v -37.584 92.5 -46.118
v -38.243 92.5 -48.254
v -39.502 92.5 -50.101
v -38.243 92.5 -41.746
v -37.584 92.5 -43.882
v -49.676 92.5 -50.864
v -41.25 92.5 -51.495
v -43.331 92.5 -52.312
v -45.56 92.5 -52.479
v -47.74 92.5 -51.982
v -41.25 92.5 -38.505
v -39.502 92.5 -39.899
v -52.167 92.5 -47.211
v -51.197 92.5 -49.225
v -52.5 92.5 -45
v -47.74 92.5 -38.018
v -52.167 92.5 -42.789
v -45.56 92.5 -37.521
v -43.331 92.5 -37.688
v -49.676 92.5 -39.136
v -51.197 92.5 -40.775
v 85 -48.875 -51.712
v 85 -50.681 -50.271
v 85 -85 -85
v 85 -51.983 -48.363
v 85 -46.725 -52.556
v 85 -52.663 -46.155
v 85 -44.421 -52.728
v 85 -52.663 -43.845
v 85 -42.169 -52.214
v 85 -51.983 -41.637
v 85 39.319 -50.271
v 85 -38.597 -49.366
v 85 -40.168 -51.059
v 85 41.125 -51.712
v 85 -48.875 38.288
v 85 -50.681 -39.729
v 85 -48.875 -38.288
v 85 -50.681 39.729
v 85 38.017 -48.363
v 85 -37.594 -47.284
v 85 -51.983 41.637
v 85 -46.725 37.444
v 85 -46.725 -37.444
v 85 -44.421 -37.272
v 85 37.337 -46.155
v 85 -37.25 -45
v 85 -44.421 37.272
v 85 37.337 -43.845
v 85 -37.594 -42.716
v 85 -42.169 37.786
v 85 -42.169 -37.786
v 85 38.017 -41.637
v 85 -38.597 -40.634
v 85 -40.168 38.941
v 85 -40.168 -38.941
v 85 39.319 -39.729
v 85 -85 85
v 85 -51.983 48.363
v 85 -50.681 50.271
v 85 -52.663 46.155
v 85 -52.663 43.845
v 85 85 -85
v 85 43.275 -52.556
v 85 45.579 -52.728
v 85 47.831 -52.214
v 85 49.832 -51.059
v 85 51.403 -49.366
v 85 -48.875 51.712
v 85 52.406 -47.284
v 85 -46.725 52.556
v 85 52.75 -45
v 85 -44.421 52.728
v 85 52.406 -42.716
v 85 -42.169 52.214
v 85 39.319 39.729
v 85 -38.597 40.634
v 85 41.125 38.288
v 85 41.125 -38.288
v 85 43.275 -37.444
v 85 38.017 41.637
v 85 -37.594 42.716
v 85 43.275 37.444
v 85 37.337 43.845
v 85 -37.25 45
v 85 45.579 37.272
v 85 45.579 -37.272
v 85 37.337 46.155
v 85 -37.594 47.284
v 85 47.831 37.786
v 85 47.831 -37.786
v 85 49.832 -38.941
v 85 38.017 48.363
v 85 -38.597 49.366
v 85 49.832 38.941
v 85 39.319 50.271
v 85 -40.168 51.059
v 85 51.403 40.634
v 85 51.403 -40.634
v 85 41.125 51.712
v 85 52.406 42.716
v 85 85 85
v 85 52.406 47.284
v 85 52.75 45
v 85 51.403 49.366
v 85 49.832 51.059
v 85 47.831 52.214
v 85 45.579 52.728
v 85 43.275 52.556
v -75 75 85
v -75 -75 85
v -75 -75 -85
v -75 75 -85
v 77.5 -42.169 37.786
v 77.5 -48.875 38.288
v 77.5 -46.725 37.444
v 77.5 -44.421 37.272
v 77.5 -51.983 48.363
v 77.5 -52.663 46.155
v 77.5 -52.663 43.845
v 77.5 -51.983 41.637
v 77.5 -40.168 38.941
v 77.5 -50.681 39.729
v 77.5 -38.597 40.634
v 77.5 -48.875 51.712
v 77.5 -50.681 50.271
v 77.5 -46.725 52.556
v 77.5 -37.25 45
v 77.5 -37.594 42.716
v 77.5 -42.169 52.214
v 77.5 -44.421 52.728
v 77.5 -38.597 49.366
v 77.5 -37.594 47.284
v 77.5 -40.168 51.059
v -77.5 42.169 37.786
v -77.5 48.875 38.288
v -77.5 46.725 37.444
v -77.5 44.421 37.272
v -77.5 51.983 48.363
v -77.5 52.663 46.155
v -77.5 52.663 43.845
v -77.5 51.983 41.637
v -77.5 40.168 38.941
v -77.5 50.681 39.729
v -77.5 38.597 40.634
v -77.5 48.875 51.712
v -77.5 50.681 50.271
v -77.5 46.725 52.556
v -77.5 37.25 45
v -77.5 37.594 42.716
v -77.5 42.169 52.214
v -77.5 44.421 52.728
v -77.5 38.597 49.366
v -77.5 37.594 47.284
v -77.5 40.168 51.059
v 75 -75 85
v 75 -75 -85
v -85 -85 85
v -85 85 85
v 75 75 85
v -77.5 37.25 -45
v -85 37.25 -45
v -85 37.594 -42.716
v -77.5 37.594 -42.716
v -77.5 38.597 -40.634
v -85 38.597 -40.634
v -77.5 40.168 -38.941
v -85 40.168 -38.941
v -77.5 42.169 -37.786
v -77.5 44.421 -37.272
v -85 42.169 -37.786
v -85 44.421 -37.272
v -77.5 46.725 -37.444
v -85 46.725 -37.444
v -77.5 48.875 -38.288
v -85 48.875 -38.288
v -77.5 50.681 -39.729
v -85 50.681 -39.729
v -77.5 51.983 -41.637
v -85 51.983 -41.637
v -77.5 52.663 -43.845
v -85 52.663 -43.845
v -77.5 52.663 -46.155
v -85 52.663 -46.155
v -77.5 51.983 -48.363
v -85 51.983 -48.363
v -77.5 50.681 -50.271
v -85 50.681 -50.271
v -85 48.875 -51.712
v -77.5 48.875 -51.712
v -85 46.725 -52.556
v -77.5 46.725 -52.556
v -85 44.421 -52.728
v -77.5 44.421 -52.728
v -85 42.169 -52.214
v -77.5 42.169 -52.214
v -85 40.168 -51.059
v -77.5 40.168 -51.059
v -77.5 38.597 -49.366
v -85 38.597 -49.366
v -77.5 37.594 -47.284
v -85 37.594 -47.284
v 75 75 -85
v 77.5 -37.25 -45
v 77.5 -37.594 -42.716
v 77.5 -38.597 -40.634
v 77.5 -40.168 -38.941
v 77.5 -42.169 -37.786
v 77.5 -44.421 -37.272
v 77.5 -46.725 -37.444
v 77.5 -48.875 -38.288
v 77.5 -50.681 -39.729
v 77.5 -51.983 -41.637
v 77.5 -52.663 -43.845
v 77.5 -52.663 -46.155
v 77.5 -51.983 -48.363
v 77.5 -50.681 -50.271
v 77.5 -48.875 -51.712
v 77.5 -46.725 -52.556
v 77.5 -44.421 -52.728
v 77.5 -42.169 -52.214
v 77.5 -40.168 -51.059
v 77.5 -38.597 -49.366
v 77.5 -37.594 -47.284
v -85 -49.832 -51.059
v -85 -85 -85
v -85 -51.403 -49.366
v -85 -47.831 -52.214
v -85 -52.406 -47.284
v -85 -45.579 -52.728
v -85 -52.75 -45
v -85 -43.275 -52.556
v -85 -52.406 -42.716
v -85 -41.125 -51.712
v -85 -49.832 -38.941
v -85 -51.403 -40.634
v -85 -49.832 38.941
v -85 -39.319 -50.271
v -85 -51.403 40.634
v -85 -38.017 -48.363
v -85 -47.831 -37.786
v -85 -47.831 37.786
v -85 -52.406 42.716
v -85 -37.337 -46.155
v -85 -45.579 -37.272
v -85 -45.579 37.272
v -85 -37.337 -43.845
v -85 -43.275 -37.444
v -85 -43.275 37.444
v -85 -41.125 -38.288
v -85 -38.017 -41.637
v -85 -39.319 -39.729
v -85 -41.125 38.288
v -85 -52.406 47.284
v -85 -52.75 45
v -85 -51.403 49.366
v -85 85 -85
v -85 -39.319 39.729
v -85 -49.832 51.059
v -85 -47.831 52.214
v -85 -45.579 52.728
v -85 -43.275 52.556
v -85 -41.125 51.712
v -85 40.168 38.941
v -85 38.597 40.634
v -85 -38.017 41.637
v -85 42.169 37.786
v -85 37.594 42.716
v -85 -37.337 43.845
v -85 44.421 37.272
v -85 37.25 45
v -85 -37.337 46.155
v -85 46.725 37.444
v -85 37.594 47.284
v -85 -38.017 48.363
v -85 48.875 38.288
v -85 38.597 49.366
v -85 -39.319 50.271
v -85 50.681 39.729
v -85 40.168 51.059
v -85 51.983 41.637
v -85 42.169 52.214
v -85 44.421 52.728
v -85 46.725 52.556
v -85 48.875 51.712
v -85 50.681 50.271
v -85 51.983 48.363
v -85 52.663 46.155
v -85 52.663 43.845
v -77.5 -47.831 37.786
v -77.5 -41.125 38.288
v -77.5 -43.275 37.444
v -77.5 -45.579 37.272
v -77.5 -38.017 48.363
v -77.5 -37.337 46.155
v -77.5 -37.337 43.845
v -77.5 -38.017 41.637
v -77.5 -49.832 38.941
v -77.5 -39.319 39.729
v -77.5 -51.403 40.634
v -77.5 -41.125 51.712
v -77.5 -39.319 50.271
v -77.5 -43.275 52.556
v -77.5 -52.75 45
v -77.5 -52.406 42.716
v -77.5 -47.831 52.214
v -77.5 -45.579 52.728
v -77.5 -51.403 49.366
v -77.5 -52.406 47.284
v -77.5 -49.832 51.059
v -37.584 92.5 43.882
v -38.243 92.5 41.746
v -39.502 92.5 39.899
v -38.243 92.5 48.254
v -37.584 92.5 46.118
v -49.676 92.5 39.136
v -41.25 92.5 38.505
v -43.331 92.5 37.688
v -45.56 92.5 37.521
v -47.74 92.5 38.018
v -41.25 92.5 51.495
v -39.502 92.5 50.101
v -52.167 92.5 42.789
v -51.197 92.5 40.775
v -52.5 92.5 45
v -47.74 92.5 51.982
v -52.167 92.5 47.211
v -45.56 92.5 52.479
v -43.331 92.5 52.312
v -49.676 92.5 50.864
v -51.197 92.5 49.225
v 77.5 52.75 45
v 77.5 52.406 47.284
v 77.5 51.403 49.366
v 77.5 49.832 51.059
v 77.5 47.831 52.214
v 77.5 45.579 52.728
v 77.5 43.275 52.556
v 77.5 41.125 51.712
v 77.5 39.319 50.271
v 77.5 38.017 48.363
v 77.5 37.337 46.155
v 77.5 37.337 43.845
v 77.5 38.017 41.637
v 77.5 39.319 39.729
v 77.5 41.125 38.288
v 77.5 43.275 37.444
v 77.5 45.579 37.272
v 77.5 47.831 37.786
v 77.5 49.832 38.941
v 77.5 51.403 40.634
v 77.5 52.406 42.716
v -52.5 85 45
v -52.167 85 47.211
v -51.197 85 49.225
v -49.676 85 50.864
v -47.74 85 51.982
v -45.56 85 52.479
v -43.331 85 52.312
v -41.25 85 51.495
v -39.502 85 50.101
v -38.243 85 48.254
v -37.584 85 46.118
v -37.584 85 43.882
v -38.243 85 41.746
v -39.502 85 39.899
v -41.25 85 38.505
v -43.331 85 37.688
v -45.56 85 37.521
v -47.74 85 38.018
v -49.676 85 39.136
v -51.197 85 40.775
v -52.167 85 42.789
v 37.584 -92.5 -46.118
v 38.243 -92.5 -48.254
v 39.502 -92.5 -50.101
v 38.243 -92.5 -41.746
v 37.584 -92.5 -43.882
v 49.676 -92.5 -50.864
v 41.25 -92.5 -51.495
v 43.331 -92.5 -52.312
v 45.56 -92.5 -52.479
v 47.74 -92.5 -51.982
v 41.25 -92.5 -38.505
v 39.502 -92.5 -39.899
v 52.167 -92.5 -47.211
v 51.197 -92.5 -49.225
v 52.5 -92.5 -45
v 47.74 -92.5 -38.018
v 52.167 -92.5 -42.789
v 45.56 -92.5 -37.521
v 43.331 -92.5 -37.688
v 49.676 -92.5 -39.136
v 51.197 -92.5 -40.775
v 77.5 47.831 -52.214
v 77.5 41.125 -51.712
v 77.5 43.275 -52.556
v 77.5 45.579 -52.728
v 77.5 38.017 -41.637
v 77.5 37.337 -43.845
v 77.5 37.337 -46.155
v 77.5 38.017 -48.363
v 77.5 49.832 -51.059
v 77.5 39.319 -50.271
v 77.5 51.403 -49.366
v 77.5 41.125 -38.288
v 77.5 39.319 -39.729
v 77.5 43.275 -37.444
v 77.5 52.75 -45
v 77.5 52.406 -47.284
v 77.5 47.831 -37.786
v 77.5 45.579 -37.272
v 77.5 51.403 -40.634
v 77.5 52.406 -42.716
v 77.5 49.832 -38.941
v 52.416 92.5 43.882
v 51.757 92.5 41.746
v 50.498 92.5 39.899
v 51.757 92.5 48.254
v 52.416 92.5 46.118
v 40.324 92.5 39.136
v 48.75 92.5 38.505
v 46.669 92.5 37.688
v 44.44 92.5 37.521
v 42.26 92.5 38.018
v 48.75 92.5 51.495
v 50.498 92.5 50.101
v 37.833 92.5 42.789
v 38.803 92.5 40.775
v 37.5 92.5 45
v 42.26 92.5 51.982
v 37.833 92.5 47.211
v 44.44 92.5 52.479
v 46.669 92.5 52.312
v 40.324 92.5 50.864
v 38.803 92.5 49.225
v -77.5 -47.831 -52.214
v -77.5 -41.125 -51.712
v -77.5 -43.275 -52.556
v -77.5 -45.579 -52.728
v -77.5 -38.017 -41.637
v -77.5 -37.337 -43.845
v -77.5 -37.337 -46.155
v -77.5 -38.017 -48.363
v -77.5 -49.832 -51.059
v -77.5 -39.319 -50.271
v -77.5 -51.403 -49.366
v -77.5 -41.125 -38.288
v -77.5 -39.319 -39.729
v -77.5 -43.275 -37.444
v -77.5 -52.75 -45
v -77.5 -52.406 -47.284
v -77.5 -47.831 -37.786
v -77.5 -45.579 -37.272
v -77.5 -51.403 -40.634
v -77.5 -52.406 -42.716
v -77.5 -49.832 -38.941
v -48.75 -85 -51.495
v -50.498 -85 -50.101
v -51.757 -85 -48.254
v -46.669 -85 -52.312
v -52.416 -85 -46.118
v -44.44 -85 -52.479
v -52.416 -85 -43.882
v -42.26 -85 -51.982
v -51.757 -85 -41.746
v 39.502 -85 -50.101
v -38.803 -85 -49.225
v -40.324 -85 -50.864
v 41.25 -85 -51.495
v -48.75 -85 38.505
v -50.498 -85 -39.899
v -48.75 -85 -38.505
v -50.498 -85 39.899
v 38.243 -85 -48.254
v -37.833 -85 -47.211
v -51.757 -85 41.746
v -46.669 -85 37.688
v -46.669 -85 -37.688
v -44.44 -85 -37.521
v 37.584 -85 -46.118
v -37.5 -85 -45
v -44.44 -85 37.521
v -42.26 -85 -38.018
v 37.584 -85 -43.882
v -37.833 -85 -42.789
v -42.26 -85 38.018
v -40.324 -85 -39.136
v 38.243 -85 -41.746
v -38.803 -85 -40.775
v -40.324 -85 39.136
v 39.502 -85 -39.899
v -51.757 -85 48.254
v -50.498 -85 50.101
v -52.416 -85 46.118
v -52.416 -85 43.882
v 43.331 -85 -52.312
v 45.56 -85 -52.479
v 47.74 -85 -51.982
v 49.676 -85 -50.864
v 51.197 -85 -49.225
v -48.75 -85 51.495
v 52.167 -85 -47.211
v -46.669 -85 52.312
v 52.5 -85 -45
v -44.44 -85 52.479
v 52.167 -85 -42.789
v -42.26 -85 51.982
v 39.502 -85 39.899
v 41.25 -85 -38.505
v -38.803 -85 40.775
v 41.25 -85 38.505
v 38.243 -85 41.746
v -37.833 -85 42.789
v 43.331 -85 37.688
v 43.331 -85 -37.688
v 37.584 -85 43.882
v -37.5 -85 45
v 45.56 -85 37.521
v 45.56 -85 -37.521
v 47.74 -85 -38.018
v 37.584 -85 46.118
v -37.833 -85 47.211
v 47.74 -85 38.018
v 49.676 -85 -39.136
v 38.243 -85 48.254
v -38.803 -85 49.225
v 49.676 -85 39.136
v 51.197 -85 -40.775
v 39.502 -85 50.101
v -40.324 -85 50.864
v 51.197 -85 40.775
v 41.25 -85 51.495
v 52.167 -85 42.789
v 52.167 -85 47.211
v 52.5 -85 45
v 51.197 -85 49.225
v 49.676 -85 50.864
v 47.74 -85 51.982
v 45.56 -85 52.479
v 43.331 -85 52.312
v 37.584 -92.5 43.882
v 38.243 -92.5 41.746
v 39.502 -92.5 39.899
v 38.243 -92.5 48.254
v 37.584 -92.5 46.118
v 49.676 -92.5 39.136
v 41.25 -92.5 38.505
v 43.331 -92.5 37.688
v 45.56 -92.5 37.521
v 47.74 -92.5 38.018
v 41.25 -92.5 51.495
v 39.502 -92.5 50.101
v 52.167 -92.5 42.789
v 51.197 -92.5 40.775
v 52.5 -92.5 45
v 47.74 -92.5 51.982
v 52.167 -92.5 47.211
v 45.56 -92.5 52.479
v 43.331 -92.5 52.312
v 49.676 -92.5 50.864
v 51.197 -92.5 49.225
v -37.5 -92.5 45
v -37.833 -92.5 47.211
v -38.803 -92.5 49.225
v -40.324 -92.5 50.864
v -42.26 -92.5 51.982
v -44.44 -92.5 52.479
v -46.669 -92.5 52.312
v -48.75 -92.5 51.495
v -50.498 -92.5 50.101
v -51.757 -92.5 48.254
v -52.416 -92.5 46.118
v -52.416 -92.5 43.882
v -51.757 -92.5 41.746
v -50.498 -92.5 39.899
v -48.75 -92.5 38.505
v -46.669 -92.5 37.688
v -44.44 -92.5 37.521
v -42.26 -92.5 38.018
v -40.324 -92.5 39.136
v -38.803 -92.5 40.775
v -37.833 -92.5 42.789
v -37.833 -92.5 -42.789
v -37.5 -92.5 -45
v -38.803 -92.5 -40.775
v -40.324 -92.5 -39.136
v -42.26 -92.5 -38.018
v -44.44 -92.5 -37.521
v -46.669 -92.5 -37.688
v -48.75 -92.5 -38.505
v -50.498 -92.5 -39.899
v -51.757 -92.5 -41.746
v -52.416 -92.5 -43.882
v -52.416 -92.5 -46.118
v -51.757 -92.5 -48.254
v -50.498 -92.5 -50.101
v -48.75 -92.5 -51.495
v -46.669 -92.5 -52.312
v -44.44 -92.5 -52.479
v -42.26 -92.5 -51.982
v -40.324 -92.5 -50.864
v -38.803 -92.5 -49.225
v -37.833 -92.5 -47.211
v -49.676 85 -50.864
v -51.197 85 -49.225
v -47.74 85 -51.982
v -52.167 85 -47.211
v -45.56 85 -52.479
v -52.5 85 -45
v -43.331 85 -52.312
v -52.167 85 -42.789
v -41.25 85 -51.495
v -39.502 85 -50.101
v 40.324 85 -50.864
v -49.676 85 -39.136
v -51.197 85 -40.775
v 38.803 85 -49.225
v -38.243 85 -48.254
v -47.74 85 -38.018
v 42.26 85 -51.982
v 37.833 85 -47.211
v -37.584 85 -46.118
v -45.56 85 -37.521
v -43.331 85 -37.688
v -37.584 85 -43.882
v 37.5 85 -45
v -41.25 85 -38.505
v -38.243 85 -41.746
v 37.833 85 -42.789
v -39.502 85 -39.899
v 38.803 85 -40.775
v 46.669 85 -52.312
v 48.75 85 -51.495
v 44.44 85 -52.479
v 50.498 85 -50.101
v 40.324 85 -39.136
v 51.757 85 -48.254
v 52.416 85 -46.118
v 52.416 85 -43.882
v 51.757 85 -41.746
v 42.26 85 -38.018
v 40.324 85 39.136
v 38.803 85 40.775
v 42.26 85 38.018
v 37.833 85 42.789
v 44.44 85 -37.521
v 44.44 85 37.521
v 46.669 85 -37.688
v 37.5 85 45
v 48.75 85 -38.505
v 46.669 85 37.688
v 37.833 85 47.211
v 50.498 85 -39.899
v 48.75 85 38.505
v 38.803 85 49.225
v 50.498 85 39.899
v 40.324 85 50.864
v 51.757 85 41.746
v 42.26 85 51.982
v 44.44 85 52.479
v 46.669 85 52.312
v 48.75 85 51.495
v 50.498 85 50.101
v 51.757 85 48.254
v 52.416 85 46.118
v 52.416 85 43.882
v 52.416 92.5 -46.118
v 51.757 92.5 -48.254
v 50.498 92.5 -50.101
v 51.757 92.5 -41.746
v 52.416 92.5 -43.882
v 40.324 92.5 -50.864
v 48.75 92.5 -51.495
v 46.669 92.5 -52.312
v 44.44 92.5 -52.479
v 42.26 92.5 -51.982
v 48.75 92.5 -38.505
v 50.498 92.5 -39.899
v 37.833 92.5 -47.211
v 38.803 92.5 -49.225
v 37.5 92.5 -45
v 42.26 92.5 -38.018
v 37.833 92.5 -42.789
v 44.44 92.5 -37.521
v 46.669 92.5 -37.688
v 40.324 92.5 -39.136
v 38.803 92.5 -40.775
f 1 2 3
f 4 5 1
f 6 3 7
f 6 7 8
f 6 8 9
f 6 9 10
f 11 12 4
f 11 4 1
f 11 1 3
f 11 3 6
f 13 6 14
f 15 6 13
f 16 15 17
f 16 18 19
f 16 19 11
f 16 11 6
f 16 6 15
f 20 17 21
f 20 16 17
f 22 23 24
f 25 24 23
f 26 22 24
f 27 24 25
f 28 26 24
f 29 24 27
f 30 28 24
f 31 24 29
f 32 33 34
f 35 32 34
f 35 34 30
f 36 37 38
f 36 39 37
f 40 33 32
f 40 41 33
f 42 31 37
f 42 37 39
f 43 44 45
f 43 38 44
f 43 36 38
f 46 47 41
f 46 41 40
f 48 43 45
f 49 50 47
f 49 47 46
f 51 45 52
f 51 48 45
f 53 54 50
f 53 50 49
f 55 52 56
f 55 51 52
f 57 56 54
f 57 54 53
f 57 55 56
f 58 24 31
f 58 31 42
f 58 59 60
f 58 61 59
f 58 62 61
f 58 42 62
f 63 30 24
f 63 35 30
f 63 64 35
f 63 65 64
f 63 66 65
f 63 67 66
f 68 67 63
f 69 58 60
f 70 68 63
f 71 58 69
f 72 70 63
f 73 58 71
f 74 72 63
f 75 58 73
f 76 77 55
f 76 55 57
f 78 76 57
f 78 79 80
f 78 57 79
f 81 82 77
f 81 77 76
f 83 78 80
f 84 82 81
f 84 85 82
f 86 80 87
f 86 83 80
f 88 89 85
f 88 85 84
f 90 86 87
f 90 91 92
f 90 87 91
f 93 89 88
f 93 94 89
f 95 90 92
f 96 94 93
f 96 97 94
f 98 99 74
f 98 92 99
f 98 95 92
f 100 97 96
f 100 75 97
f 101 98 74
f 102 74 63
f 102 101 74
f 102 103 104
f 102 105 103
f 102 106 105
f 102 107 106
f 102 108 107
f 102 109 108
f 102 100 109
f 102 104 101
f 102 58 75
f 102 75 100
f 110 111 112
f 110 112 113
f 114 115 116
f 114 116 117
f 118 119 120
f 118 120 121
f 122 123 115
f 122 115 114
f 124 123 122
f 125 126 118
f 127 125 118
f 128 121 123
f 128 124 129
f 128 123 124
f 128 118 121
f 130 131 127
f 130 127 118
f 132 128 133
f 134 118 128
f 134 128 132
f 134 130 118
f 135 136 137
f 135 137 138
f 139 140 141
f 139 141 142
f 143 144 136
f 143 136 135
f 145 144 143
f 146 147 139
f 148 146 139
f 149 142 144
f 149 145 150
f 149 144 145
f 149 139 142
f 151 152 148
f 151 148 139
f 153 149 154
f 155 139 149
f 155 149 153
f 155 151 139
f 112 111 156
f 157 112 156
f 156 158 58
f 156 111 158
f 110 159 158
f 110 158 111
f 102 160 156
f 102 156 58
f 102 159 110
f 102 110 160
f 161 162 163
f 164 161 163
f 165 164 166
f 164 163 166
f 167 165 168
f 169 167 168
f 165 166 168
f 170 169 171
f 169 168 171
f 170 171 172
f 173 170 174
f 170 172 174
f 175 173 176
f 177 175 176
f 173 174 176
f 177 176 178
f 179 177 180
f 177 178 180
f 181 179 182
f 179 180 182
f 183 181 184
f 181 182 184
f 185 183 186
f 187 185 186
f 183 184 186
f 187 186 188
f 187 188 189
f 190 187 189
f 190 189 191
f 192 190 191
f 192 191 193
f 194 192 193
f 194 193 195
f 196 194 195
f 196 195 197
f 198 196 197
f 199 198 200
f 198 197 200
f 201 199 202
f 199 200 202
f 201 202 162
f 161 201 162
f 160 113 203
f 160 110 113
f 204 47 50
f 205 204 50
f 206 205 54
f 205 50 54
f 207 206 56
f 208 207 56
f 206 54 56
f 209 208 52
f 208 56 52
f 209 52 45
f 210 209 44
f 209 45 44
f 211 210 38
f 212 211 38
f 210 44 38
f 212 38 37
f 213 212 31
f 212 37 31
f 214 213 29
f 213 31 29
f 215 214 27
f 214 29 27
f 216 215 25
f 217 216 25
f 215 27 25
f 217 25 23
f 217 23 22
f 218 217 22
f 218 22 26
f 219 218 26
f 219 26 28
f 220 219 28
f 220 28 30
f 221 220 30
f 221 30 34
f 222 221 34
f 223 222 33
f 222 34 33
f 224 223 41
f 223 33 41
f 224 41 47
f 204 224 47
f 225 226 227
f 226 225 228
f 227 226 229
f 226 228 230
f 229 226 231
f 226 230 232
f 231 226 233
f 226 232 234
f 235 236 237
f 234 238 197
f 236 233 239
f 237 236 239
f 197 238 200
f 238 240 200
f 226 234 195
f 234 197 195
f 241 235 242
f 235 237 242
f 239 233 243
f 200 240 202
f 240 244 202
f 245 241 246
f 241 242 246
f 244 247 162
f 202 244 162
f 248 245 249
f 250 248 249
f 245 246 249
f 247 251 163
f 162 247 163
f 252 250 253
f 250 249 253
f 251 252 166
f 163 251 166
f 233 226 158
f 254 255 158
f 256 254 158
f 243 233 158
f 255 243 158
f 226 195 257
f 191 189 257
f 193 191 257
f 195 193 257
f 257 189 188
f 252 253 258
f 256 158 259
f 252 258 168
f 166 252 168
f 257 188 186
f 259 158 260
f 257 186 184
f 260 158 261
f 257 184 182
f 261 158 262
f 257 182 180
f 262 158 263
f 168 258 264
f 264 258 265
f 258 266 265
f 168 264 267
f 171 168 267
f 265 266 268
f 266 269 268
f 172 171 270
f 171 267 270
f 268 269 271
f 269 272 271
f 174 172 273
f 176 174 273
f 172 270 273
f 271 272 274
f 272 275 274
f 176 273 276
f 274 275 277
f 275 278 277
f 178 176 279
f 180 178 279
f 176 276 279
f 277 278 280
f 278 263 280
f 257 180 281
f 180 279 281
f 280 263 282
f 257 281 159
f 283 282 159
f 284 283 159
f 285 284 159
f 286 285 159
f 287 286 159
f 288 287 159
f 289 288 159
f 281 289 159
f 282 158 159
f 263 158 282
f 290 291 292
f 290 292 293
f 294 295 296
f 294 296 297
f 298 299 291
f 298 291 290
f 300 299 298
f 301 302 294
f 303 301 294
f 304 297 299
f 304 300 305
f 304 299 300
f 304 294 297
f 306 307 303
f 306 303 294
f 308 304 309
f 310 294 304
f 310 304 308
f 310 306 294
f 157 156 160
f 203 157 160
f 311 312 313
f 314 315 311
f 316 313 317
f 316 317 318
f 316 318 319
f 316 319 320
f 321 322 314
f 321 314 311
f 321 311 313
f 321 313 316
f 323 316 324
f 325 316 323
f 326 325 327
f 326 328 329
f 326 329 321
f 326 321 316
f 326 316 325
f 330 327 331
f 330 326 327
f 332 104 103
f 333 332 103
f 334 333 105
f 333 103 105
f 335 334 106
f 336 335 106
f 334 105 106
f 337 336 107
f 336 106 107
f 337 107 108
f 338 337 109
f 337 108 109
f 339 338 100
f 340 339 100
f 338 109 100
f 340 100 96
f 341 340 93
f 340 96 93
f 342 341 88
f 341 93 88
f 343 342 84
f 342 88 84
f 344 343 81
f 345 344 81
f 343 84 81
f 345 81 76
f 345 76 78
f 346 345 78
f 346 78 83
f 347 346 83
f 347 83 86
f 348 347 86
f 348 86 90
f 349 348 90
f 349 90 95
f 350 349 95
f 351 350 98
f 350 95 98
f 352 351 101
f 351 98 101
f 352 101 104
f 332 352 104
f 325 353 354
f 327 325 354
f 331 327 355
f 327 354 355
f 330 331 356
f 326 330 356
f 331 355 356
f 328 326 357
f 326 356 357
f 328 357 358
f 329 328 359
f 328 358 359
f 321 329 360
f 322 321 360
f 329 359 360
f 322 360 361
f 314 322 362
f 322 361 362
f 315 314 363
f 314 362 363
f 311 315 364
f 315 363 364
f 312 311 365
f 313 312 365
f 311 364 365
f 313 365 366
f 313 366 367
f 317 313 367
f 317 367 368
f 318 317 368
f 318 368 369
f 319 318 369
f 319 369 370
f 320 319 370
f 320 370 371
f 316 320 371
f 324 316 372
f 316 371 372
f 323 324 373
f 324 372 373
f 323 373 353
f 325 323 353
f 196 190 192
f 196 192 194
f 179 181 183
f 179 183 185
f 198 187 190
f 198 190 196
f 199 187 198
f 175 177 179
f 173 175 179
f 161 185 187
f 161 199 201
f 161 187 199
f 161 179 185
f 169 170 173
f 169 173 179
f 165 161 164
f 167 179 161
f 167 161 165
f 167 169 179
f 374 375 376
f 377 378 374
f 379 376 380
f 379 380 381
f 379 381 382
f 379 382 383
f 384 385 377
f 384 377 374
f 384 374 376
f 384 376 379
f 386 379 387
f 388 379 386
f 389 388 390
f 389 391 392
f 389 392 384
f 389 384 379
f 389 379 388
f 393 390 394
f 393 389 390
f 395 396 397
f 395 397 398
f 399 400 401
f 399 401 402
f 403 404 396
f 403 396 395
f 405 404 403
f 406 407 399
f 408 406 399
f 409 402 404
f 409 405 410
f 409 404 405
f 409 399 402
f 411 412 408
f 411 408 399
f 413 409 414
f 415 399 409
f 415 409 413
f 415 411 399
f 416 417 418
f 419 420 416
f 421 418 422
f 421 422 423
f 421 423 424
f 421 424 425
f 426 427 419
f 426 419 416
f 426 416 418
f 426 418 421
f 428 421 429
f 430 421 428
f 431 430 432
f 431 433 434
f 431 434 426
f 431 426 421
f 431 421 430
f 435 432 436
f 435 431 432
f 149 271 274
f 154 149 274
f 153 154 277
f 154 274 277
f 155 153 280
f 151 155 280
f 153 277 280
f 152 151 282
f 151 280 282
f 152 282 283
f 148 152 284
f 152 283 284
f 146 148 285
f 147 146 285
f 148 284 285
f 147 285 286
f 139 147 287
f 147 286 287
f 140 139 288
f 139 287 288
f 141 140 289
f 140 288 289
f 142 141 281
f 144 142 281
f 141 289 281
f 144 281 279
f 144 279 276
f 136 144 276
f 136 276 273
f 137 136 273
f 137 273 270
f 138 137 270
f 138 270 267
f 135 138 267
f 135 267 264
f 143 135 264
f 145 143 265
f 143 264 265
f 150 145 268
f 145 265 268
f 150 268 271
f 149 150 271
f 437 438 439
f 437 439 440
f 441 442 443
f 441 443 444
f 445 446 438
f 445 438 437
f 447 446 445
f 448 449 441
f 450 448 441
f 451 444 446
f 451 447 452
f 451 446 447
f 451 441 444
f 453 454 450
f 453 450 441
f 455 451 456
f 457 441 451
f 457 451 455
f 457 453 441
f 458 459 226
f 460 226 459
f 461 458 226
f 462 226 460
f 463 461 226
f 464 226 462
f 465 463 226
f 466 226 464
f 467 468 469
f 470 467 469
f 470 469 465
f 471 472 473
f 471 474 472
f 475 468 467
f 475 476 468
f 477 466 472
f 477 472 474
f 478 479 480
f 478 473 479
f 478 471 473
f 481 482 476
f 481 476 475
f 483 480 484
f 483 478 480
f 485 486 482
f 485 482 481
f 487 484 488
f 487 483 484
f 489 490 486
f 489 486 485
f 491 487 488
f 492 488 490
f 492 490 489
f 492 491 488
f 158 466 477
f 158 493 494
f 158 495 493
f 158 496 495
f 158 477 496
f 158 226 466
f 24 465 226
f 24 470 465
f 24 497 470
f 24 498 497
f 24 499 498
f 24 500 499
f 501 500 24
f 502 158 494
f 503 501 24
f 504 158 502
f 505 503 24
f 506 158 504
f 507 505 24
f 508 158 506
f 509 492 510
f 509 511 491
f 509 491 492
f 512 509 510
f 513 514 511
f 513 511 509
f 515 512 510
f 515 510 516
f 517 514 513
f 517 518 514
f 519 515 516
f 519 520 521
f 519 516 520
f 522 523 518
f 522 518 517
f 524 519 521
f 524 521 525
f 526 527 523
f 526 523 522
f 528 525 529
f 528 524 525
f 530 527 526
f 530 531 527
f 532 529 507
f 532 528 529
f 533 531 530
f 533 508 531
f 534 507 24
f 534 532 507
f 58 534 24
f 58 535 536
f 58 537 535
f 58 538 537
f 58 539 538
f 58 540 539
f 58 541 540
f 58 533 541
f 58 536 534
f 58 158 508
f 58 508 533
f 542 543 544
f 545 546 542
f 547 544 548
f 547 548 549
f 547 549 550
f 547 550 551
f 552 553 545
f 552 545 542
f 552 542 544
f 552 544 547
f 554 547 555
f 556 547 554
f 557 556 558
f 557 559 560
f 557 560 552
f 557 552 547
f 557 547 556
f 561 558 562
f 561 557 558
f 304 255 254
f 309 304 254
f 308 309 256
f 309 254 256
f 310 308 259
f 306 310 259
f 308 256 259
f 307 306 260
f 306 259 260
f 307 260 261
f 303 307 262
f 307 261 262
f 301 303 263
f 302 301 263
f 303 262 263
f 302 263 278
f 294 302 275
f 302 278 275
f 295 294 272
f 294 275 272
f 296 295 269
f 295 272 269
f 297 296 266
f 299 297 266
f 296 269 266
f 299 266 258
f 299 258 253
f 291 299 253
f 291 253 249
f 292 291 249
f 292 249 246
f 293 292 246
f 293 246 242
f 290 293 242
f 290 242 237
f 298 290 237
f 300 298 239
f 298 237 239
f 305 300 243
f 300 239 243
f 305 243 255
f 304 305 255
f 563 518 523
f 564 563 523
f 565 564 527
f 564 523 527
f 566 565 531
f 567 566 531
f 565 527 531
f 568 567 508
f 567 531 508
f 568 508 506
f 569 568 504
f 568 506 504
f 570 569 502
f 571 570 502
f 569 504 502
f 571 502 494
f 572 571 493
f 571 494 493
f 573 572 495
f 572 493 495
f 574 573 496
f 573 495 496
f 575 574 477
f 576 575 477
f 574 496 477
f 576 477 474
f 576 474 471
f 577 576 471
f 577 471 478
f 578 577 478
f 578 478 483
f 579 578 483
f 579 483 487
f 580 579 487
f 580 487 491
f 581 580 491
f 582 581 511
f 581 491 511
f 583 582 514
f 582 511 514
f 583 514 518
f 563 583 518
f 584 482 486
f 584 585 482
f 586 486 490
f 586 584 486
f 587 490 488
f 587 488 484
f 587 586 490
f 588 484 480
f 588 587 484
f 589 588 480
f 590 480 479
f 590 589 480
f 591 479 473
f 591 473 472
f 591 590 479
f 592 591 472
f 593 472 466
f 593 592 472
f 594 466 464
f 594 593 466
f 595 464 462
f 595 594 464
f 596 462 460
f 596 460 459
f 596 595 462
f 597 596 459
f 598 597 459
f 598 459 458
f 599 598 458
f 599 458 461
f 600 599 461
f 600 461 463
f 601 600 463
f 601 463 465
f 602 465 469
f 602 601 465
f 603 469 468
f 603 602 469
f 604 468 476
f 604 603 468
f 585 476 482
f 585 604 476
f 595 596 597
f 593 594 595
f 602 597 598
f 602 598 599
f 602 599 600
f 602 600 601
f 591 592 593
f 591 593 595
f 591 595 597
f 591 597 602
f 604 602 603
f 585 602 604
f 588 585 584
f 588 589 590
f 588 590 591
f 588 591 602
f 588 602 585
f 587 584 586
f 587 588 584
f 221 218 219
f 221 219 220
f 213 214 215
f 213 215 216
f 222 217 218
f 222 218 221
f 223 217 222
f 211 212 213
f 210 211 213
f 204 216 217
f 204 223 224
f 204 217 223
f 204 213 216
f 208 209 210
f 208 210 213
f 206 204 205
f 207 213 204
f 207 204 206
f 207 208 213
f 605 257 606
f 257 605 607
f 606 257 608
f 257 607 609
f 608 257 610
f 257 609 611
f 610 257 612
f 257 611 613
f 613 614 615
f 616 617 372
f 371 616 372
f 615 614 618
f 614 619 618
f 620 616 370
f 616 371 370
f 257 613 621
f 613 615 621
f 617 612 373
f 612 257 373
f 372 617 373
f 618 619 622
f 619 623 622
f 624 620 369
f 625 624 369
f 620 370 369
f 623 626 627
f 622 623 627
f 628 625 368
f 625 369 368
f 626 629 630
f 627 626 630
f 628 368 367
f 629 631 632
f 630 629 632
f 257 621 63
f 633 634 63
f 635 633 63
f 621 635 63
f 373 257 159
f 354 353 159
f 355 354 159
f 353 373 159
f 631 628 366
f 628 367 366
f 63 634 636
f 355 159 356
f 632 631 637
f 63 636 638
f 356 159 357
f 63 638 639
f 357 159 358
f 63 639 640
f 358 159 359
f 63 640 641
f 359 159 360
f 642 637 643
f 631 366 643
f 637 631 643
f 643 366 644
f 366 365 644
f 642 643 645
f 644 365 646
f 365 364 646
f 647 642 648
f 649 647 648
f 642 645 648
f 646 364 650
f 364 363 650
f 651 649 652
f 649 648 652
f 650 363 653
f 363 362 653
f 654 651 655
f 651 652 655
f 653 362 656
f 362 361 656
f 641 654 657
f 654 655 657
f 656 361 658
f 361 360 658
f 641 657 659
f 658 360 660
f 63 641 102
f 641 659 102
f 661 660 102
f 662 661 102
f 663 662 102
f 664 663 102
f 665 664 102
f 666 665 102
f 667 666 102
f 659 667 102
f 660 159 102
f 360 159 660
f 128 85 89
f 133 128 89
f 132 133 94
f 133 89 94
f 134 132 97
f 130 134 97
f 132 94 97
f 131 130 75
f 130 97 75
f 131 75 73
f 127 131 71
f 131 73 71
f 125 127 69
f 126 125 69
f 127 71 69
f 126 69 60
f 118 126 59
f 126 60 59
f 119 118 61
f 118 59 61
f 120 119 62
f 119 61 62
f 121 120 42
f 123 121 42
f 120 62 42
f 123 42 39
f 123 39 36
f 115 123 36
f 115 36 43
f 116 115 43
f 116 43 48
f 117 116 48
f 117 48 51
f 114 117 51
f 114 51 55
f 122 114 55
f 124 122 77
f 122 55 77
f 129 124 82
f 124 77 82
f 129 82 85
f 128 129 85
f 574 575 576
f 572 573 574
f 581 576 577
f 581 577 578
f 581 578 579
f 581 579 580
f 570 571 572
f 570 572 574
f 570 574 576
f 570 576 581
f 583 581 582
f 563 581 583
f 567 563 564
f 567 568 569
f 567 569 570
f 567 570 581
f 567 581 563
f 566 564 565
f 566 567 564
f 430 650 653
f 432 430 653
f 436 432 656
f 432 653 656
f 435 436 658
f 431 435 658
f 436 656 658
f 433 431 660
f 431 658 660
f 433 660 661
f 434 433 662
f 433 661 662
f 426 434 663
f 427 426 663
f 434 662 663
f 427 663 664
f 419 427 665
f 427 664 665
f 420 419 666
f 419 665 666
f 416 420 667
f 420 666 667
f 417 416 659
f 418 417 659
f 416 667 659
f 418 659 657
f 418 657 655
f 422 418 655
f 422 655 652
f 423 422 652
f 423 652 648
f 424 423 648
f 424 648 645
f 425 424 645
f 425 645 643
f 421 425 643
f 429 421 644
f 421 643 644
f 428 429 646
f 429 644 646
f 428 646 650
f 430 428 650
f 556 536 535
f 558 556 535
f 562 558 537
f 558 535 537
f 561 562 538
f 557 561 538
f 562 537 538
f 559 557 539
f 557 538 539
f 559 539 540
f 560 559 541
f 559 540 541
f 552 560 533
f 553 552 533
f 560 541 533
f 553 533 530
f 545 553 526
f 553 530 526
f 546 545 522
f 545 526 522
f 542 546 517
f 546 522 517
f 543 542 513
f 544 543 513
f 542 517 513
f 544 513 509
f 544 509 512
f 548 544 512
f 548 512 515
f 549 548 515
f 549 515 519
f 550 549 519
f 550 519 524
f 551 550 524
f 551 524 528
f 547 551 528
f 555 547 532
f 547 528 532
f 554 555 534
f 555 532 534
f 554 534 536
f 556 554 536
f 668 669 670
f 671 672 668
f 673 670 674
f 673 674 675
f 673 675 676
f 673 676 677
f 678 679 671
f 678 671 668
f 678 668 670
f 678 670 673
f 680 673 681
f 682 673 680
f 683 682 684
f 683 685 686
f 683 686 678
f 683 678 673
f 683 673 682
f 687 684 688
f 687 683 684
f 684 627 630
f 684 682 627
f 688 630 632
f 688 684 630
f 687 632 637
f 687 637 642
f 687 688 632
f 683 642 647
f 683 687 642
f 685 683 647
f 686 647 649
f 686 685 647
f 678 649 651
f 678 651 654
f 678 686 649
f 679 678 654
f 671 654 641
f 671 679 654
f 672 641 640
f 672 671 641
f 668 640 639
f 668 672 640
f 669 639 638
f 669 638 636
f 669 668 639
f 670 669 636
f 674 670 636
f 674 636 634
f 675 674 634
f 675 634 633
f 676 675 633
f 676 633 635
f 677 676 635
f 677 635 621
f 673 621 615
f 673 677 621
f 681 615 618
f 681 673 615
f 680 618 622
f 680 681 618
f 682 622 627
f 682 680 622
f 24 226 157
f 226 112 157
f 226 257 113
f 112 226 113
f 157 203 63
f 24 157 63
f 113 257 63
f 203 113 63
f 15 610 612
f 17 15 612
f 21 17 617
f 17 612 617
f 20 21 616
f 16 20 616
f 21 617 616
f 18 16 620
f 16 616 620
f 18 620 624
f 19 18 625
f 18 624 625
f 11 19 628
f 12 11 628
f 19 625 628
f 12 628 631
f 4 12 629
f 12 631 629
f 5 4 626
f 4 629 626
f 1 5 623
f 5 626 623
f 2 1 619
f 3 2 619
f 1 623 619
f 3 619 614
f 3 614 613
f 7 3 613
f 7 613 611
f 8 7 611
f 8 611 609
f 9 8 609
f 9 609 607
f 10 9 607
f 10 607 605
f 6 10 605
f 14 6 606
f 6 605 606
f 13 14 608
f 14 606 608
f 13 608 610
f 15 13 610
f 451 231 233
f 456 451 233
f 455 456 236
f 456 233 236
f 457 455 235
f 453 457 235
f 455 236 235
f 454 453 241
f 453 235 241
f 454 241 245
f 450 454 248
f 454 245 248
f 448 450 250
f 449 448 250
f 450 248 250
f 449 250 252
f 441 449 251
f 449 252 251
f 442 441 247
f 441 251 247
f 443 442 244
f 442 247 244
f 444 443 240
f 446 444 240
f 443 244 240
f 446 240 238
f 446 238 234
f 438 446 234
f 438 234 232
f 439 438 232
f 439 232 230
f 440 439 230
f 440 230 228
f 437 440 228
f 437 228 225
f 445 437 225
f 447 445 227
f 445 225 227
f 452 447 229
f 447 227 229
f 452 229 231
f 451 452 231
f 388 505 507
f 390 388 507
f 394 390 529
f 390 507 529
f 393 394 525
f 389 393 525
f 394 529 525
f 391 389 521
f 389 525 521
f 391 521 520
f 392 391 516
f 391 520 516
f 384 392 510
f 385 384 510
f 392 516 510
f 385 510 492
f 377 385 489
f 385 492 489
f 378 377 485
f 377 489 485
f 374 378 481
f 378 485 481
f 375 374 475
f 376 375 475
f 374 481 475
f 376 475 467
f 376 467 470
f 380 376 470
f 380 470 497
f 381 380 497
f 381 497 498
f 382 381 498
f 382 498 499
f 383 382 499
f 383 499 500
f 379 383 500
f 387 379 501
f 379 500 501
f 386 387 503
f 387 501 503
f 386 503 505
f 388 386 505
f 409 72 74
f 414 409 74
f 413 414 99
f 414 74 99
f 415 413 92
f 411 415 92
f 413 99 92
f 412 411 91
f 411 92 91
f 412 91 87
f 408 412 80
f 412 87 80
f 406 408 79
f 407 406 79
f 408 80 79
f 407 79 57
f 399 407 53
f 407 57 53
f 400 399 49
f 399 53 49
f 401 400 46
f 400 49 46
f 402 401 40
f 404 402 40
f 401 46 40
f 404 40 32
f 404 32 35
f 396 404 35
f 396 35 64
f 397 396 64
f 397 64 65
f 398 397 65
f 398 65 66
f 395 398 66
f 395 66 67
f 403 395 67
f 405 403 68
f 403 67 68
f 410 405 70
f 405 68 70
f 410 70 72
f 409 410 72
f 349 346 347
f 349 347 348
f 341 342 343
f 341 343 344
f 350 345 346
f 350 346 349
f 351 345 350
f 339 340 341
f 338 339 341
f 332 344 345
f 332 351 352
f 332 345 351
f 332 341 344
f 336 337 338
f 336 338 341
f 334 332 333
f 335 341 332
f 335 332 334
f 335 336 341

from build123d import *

# Parameters (mm, degrees)
F0_W      = 170
F0_H      = 170
F1_DEPTH  = 85
F2_W      = 150
F2_H      = 150
F3_DEPTH  = 85
F7_R      = 7.5
F8_DEPTH  = 7.5
F6_R      = 7.5
F9_DEPTH  = 7.5
F5_R      = 7.75
F10_DEPTH = 7.5
F4_R      = 7.75
F11_DEPTH = 7.5


with BuildPart() as f1:
    # F0 (on Top) → F1 (new body, symmetric)
    with BuildSketch(Plane.XY):
        Rectangle(F0_W, F0_H)
    extrude(amount=F1_DEPTH, both=True)

    # F2 (on Top) → F3 (cut, symmetric)
    with BuildSketch(Plane.XY):
        Rectangle(F2_W, F2_H)
    extrude(amount=F3_DEPTH, both=True, mode=Mode.SUBTRACT)

    # F7 (on face) → F8 (join, symmetric)
    with BuildSketch(Plane.XZ.offset(85)):
        with Locations((-45, 45)):
            Circle(F7_R)
        with Locations((45, 45)):
            Circle(F7_R)
        with Locations((45, -45)):
            Circle(F7_R)
        with Locations((-45, -45)):
            Circle(F7_R)
    extrude(amount=F8_DEPTH, both=True)

    # F6 (on face) → F9 (join, symmetric)
    with BuildSketch(Plane(origin=(0, 85, 0), x_dir=(-1, 0, 0), z_dir=(0, 1, 0))):
        with Locations((45, -45)):
            Circle(F6_R)
        with Locations((45, 45)):
            Circle(F6_R)
        with Locations((-45, 45)):
            Circle(F6_R)
        with Locations((-45, -45)):
            Circle(F6_R)
    extrude(amount=F9_DEPTH, both=True)

    # F5 (on face) → F10 (cut, symmetric)
    with BuildSketch(Plane(origin=(-85, 0, 0), x_dir=(0, -1, 0), z_dir=(-1, 0, 0))):
        with Locations((-45, 45)):
            Circle(F5_R)
        with Locations((45, 45)):
            Circle(F5_R)
        with Locations((45, -45)):
            Circle(F5_R)
        with Locations((-45, -45)):
            Circle(F5_R)
    extrude(amount=F10_DEPTH, both=True, mode=Mode.SUBTRACT)

    # F4 (on face) → F11 (cut, symmetric)
    with BuildSketch(Plane.YZ.offset(85)):
        with Locations((-45, 45)):
            Circle(F4_R)
        with Locations((45, 45)):
            Circle(F4_R)
        with Locations((45, -45)):
            Circle(F4_R)
        with Locations((-45, -45)):
            Circle(F4_R)
    extrude(amount=F11_DEPTH, both=True, mode=Mode.SUBTRACT)


solid = f1.part
